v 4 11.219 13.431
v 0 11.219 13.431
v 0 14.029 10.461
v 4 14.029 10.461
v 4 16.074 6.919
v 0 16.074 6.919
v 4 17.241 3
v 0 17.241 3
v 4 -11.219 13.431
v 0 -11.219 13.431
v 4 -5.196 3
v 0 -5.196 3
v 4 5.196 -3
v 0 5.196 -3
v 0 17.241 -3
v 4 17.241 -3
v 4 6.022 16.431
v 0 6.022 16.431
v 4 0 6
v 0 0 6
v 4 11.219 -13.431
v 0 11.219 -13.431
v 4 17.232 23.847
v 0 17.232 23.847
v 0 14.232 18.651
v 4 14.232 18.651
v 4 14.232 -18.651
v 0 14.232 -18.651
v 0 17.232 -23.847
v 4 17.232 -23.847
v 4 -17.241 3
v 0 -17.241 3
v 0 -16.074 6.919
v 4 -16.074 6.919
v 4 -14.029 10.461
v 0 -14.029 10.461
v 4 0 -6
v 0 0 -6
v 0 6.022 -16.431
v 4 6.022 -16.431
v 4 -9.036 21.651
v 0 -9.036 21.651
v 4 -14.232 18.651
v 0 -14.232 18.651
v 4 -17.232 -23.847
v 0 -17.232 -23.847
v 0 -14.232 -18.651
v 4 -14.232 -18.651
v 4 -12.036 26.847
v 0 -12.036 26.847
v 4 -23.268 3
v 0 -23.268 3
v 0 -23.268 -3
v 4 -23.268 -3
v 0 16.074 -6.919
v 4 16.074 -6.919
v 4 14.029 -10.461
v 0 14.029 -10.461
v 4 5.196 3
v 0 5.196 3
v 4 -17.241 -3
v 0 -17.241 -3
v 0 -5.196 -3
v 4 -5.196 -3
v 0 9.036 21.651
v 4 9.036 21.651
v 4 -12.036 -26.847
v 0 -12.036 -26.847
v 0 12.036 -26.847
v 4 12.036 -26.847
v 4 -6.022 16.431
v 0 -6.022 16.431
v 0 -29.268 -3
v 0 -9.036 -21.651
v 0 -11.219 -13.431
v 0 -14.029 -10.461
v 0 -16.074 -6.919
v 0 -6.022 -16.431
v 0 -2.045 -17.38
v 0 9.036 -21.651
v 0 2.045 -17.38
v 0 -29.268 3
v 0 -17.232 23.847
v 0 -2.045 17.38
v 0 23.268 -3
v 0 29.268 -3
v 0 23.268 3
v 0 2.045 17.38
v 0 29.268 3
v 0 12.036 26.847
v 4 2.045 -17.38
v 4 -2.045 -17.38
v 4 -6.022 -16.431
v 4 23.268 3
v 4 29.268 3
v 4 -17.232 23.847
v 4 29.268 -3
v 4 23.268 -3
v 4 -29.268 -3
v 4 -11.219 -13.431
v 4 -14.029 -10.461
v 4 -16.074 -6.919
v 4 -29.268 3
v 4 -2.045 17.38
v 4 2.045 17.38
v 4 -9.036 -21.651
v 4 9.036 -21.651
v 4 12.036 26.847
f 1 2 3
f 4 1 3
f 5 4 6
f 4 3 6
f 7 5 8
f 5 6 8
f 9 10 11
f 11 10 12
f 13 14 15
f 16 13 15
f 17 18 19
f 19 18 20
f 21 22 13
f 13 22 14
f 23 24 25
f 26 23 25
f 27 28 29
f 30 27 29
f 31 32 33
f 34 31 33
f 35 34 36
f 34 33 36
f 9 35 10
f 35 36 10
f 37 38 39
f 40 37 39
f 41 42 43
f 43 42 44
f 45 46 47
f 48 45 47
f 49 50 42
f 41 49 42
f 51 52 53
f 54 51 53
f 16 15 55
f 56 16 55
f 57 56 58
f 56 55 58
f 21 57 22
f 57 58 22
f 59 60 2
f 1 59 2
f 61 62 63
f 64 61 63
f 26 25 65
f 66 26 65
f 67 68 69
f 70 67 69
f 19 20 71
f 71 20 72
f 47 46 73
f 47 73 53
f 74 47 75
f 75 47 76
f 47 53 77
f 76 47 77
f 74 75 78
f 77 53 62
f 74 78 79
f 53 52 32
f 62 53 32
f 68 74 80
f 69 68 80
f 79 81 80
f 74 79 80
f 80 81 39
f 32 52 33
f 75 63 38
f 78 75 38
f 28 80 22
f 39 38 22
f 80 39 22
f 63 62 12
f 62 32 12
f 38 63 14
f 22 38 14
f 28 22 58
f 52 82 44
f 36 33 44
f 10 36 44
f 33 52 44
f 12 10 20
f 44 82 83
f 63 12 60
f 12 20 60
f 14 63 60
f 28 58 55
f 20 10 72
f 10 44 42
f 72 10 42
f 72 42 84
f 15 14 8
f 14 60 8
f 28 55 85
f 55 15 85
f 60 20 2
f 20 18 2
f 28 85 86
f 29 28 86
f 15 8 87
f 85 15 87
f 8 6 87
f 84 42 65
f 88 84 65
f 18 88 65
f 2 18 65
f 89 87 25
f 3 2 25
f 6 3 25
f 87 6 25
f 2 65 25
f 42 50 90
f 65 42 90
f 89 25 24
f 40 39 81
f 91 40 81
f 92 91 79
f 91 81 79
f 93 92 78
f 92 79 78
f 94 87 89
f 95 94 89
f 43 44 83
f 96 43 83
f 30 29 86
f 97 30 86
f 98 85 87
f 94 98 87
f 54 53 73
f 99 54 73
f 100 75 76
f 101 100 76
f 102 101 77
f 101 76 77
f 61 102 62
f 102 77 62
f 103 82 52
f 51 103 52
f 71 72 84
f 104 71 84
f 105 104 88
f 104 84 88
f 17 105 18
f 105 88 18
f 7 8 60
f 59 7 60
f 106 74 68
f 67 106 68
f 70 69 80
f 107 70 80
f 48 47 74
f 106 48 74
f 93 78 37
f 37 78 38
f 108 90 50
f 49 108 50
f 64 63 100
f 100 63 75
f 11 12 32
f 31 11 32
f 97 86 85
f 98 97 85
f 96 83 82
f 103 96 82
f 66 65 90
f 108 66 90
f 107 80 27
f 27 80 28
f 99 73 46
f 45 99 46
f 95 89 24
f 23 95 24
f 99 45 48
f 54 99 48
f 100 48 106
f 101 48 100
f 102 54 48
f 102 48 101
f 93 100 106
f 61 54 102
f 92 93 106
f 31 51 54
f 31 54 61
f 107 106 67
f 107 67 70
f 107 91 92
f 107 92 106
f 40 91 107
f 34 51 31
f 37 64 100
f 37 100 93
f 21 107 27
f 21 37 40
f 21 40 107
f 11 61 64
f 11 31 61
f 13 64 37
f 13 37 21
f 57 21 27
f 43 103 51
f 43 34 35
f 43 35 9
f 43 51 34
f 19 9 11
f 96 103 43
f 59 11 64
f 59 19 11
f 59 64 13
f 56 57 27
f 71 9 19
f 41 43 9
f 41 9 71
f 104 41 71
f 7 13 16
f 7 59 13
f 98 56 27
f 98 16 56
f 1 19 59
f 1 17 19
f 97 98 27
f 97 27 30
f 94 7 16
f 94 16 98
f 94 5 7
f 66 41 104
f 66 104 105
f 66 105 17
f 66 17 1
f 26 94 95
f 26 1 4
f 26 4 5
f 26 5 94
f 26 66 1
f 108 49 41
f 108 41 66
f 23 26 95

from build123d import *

# Parameters (mm, degrees)
F1_DEPTH = 4


with BuildPart() as f1:
    # F0 (on Right) → F1 (new body)
    with BuildSketch(Plane.YZ):
        Polygon((17.2320508076, -23.8467875173), (29.2679491924, -3), (23.2679491924, -3), (23.2679491924, 3), (29.2679491924, 3), (17.2320508076, 23.8467875173), (14.2320508076, 18.6506350946), (9.0358983849, 21.6506350946), (12.0358983849, 26.8467875173), (-12.0358983849, 26.8467875173), (-9.0358983849, 21.6506350946), (-14.2320508076, 18.6506350946), (-17.2320508076, 23.8467875173), (-29.2679491924, 3), (-23.2679491924, 3), (-23.2679491924, -3), (-29.2679491924, -3), (-17.2320508076, -23.8467875173), (-14.2320508076, -18.6506350946), (-9.0358983849, -21.6506350946), (-12.0358983849, -26.8467875173), (12.0358983849, -26.8467875173), (9.0358983849, -21.6506350946), (14.2320508076, -18.6506350946), align=None)
        with BuildLine():
            ThreePointArc((17.2409396496, 3), (17.4351146235, 1.5055823014), (17.5, 0))
            ThreePointArc((17.5, 0), (17.4351146235, -1.5055823014), (17.2409396496, -3))
            ThreePointArc((17.2409396496, -3), (15.1554445662, -8.75), (11.2185460361, -13.4310917216))
            ThreePointArc((11.2185460361, -13.4310917216), (8.75, -15.1554445662), (6.0223936134, -16.4310917216))
            ThreePointArc((6.0223936134, -16.4310917216), (0, -17.5), (-6.0223936134, -16.4310917216))
            ThreePointArc((-6.0223936134, -16.4310917216), (-8.75, -15.1554445662), (-11.2185460361, -13.4310917216))
            ThreePointArc((-11.2185460361, -13.4310917216), (-15.1554445662, -8.75), (-17.2409396496, -3))
            ThreePointArc((-17.2409396496, -3), (-17.5, 0), (-17.2409396496, 3))
            ThreePointArc((-17.2409396496, 3), (-15.1554445662, 8.75), (-11.2185460361, 13.4310917216))
            ThreePointArc((-11.2185460361, 13.4310917216), (-8.75, 15.1554445662), (-6.0223936134, 16.4310917216))
            ThreePointArc((-6.0223936134, 16.4310917216), (0, 17.5), (6.0223936134, 16.4310917216))
            ThreePointArc((6.0223936134, 16.4310917216), (8.75, 15.1554445662), (11.2185460361, 13.4310917216))
            ThreePointArc((11.2185460361, 13.4310917216), (15.1554445662, 8.75), (17.2409396496, 3))
        make_face(mode=Mode.SUBTRACT)
        with BuildLine():
            ThreePointArc((17.2409396496, -3), (17.4351146235, -1.5055823014), (17.5, 0))
            ThreePointArc((17.5, 0), (17.4351146235, 1.5055823014), (17.2409396496, 3))
            Line((17.2409396496, 3), (5.1961524227, 3))
            Line((5.1961524227, 3), (3.4641016151, 0))
            Line((3.4641016151, 0), (5.1961524227, -3))
            Line((5.1961524227, -3), (17.2409396496, -3))
        make_face()
        with BuildLine():
            Line((5.1961524227, 3), (11.2185460361, 13.4310917216))
            ThreePointArc((11.2185460361, 13.4310917216), (8.75, 15.1554445662), (6.0223936134, 16.4310917216))
            Line((6.0223936134, 16.4310917216), (0, 6))
            Line((0, 6), (1.7320508076, 3))
            Line((1.7320508076, 3), (5.1961524227, 3))
        make_face()
        Polygon((3.4641016151, 0), (5.1961524227, 3), (1.7320508076, 3), align=None)
        with BuildLine():
            ThreePointArc((6.0223936134, -16.4310917216), (8.75, -15.1554445662), (11.2185460361, -13.4310917216))
            Line((11.2185460361, -13.4310917216), (5.1961524227, -3))
            Line((5.1961524227, -3), (1.7320508076, -3))
            Line((1.7320508076, -3), (0, -6))
            Line((0, -6), (6.0223936134, -16.4310917216))
        make_face()
        Polygon((1.7320508076, -3), (5.1961524227, -3), (3.4641016151, 0), align=None)
        Polygon((-1.7320508076, 3), (1.7320508076, 3), (0, 6), align=None)
        Polygon((3.4641016151, 0), (1.7320508076, 3), (-1.7320508076, 3), (-3.4641016151, 0), (-1.7320508076, -3), (1.7320508076, -3), align=None)
        Polygon((0, -6), (1.7320508076, -3), (-1.7320508076, -3), align=None)
        with BuildLine():
            Line((0, 6), (-6.0223936134, 16.4310917216))
            ThreePointArc((-6.0223936134, 16.4310917216), (-8.75, 15.1554445662), (-11.2185460361, 13.4310917216))
            Line((-11.2185460361, 13.4310917216), (-5.1961524227, 3))
            Line((-5.1961524227, 3), (-1.7320508076, 3))
            Line((-1.7320508076, 3), (0, 6))
        make_face()
        Polygon((-3.4641016151, 0), (-1.7320508076, 3), (-5.1961524227, 3), align=None)
        with BuildLine():
            ThreePointArc((-11.2185460361, -13.4310917216), (-8.75, -15.1554445662), (-6.0223936134, -16.4310917216))
            Line((-6.0223936134, -16.4310917216), (0, -6))
            Line((0, -6), (-1.7320508076, -3))
            Line((-1.7320508076, -3), (-5.1961524227, -3))
            Line((-5.1961524227, -3), (-11.2185460361, -13.4310917216))
        make_face()
        Polygon((-5.1961524227, -3), (-1.7320508076, -3), (-3.4641016151, 0), align=None)
        with BuildLine():
            Line((-3.4641016151, 0), (-5.1961524227, 3))
            Line((-5.1961524227, 3), (-17.2409396496, 3))
            ThreePointArc((-17.2409396496, 3), (-17.5, 0), (-17.2409396496, -3))
            Line((-17.2409396496, -3), (-5.1961524227, -3))
            Line((-5.1961524227, -3), (-3.4641016151, 0))
        make_face()
    extrude(amount=F1_DEPTH)


solid = f1.part
